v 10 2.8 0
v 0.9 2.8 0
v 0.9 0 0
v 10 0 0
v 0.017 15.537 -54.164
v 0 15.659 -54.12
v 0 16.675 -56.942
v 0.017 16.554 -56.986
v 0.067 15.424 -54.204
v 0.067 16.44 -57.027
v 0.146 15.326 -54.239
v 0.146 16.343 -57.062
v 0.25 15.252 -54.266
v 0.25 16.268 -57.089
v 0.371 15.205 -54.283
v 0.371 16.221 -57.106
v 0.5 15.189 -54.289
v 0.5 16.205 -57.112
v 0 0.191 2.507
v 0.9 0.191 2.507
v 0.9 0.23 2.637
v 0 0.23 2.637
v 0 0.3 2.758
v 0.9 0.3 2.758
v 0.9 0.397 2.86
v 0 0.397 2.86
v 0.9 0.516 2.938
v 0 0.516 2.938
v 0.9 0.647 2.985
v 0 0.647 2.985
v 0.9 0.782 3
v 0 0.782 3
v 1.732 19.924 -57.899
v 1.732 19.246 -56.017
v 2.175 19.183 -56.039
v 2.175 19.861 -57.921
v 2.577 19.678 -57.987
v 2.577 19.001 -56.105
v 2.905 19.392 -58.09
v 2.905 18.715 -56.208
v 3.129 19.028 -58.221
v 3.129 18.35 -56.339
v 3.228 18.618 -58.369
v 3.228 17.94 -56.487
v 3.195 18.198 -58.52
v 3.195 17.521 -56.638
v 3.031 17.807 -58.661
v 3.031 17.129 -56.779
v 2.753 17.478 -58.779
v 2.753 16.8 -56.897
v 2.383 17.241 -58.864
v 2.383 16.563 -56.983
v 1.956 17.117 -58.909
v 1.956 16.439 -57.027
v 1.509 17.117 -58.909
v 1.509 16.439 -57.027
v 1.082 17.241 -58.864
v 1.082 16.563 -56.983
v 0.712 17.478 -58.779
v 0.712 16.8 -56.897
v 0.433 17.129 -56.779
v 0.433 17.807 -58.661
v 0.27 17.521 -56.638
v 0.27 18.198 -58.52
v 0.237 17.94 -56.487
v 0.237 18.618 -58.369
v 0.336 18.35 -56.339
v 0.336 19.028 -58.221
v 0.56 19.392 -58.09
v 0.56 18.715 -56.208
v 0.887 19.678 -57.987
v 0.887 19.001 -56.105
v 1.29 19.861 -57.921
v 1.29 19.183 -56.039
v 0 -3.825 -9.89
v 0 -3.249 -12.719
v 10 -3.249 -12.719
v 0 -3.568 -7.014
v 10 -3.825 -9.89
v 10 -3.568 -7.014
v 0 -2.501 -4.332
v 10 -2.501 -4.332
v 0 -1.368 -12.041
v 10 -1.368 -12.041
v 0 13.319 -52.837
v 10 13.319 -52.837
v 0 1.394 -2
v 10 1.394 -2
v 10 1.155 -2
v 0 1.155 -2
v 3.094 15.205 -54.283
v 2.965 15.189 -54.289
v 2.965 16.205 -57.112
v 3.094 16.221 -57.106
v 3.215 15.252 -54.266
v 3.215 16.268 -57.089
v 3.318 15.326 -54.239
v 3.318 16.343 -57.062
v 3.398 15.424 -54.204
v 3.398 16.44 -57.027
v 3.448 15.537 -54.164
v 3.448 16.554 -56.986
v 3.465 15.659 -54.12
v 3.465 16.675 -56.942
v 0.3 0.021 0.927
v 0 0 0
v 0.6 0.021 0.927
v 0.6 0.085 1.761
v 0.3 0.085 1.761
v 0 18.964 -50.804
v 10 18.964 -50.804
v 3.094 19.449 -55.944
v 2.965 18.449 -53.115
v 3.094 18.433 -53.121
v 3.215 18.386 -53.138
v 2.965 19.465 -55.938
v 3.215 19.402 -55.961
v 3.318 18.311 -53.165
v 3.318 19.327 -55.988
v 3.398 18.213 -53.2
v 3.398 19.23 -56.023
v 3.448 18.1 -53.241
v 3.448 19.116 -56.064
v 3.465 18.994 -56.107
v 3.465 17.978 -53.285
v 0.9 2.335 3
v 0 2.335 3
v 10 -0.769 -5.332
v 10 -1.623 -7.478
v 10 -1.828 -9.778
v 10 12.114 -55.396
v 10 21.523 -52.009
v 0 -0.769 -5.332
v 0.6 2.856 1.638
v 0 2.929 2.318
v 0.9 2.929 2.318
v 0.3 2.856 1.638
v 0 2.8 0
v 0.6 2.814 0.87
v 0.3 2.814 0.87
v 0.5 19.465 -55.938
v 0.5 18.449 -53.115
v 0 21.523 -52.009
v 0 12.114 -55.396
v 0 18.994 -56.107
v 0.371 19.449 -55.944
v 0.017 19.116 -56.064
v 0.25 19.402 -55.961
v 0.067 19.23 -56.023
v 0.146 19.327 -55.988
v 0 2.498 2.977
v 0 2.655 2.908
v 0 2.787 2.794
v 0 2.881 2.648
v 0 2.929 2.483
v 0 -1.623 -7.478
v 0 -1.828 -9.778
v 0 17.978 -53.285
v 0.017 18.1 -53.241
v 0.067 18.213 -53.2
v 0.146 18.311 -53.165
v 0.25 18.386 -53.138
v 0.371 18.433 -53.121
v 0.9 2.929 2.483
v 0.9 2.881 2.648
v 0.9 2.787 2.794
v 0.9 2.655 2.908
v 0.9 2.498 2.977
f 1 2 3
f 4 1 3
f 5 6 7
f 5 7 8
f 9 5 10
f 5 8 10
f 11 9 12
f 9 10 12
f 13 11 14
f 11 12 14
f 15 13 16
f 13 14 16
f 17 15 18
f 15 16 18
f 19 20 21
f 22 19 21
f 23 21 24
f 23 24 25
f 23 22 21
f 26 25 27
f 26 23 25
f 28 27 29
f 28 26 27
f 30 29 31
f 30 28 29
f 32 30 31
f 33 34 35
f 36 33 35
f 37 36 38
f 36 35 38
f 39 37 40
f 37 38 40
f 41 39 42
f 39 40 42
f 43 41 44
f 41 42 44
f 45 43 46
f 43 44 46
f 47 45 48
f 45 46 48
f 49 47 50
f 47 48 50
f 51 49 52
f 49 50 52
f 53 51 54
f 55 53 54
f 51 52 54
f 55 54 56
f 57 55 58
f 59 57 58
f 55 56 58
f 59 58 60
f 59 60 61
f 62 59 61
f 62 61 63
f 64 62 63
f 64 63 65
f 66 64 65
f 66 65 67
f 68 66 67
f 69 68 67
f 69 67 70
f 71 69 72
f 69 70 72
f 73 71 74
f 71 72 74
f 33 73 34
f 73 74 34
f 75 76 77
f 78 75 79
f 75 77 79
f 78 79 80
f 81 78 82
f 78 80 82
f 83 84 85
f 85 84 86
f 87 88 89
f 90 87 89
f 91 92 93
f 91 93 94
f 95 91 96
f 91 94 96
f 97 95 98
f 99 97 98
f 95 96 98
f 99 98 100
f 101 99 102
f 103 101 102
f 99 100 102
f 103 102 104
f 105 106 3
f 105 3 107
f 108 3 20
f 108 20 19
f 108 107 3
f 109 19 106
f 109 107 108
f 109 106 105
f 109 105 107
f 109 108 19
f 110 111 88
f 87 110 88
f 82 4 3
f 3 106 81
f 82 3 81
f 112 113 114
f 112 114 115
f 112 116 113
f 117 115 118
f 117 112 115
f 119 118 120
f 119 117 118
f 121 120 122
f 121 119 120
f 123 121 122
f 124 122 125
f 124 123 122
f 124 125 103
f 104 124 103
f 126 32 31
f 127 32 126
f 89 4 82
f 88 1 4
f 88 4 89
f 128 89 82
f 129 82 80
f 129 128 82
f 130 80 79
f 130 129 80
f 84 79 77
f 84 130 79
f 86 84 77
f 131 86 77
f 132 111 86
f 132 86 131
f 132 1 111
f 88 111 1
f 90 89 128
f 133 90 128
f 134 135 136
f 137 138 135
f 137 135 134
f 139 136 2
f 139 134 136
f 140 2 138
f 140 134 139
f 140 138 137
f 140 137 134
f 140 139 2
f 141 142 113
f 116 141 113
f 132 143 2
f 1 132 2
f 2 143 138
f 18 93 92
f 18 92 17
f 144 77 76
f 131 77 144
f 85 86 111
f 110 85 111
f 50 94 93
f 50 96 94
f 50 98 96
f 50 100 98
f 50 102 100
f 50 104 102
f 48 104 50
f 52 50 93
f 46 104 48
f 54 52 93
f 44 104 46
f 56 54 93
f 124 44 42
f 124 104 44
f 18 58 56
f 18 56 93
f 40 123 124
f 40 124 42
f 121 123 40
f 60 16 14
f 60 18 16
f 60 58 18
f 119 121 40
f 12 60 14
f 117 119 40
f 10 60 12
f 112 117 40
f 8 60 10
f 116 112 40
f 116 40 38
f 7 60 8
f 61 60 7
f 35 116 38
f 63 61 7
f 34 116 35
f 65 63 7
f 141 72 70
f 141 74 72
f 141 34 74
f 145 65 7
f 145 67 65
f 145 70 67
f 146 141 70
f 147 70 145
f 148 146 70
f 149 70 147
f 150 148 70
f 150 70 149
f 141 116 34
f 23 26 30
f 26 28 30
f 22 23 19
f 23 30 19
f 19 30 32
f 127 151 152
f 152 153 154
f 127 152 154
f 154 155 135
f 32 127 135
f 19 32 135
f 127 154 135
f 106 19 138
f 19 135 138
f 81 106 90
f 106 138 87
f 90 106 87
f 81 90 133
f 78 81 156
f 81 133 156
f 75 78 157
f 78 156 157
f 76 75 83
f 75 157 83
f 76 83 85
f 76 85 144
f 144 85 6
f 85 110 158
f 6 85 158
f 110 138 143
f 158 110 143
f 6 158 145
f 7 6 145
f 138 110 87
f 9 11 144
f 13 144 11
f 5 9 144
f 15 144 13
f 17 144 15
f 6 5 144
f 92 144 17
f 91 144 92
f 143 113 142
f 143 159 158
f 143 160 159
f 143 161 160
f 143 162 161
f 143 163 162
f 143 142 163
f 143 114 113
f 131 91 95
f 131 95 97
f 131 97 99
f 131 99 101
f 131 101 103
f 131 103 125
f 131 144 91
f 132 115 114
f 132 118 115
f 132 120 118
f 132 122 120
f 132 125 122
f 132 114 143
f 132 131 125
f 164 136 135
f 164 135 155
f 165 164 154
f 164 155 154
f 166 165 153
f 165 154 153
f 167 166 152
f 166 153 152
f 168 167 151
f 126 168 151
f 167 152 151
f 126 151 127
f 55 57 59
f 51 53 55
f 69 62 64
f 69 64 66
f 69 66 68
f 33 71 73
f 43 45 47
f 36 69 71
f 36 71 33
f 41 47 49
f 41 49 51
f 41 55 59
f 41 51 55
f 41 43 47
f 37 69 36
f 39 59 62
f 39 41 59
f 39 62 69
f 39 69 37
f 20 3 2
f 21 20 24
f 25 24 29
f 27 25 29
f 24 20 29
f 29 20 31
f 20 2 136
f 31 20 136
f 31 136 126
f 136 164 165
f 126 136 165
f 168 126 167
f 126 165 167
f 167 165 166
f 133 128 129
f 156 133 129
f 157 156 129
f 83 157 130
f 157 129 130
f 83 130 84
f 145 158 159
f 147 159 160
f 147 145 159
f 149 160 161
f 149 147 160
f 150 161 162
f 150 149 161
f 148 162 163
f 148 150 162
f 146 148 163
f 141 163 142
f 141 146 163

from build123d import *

# Parameters (mm, degrees)
BOSS_EXTRUDE1_DEPTH = 0.9
FILLET1_R           = 0.5
BOSS_EXTRUDE2_DEPTH = 10
BOSS_EXTRUDE3_DEPTH = 10
BOSS_EXTRUDE4_DEPTH = 10
CUT_EXTRUDE2_DEPTH  = 61.26562122547703
FILLET2_R           = 10
CUT_EXTRUDE3_DEPTH  = 61.26562122547703
CUT_EXTRUDE4_DEPTH  = 61.265621208883815
FILLET3_R           = 0.6
SKETCH10_R          = 2.1
BOSS_EXTRUDE5_DEPTH = 3
SKETCH11_R          = 1.5
BOSS_EXTRUDE6_DEPTH = 2
BOSS_EXTRUDE7_DEPTH = 3
SKETCH14_R          = 1.5000000000000002
BOSS_EXTRUDE8_DEPTH = 2
FILLET4_R           = 0.5


# Read off the part's stored shape, not the designer's step: Split1
with BuildPart() as part:
    # Sketch1 → Boss-Extrude1 (new body)
    with BuildSketch(Plane(origin=(0, 0, 0), x_dir=(0, 0, -1), z_dir=(1, 0, 0))):
        with BuildLine():
            Line((0, 2.8), (0, 0))
            add(Edge.make_bspline(
                [(0, 0), (-5.0882686653691644, 0), (-6.101472647573343, 1.7391212131518174), (-7.000000000000001, 5.128421052631583)],
                knots=[0, 0, 0, 0, 1, 1, 1, 1], degree=3))
            add(Edge.make_bspline(
                [(-7.000000000000001, 5.128421052631583), (-4.554183023047009, 3.433770739772326), (-3.654213934684202, 2.799999999999996), (0, 2.8)],
                knots=[0, 0, 0, 0, 1, 1, 1, 1], degree=3))
        make_face()
    extrude(amount=BOSS_EXTRUDE1_DEPTH)

    # Fillet1
    fillet1_edges = [part.edges().sort_by_distance(p)[0] for p in [
        (0.45, 5.128421052631583, 7.000000000000001),
    ]]
    fillet(fillet1_edges, radius=FILLET1_R)

    # Sketch3 → Boss-Extrude2 (add)
    with BuildSketch(Plane(origin=(0, 0, 0), x_dir=(0, 0, -1), z_dir=(1, 0, 0))):
        Polygon((0, 0), (40, 0), (40, 10), (20, 9.999999999999998), (0, 2.8), align=None)
    extrude(amount=BOSS_EXTRUDE2_DEPTH)

    # Sketch5 → Boss-Extrude3 (add)
    with BuildSketch(Plane(origin=(0, 0, 0), x_dir=(0, 0, -1), z_dir=(1, 0, 0))):
        Polygon((0, 0), (20.000000000000004, -11.54700538379255), (40, -11.547005383792548), (40, 0), align=None)
    extrude(amount=BOSS_EXTRUDE3_DEPTH)

    # Sketch6 → Boss-Extrude4 (add)
    with BuildSketch(Plane(origin=(10, 0, 0), x_dir=(0, 0, -1), z_dir=(1, 0, 0))):
        Polygon((8.351482323931023, -4.821730567853972), (55.39585291736738, 12.114242845783108), (52.00865823463995, 21.523116964470375), (20, 9.999999999999998), align=None)
    extrude(amount=-BOSS_EXTRUDE4_DEPTH)

    # Sketch7 → Cut-Extrude2 (cut, through all)
    with BuildSketch(Plane(origin=(10, 0, 0), x_dir=(0, 0, -1), z_dir=(1, 0, 0))):
        Polygon((40, 6.571735795530855), (-6.396657859934056, -10.1310610340454), (25.03138273349842, -20.31963634568749), (52.56184703999606, -5.85197020171655), align=None)
    extrude(amount=-CUT_EXTRUDE2_DEPTH, mode=Mode.SUBTRACT)

    # Fillet2
    fillet2_edges = [part.edges().sort_by_distance(p)[0] for p in [
        (5, -4.821730567853985, -8.351482323931002),
    ]]
    fillet(fillet2_edges, radius=FILLET2_R)

    # Sketch8 → Cut-Extrude3 (cut, through all)
    with BuildSketch(Plane(origin=(10, 0, 0), x_dir=(0, 0, -1), z_dir=(1, 0, 0))):
        with BuildLine():
            Line((2, 1.15470053837925), (5.3316294573154766, -0.7688166256419326))
            ThreePointArc((5.3316294573154766, -0.7688166256419326), (8.6203969477251, -1.8089349449339256), (12.041385203497414, -1.3677126903162435))
            Line((12.041385203497414, -1.3677126903162435), (52.83663915708444, 13.318578732975077))
            Line((52.83663915708444, 13.318578732975077), (50.80432234744798, 18.963903204187442))
            Line((50.80432234744798, 18.963903204187442), (2, 1.394347159106174))
            Line((2, 1.394347159106174), (2, 1.15470053837925))
        make_face()
    extrude(amount=-CUT_EXTRUDE3_DEPTH, mode=Mode.SUBTRACT)

    # Sketch9 → Cut-Extrude4 (cut, through all)
    with BuildSketch(Plane.ZY):
        Polygon((3.0000000000000013, -0.988739395943905), (3.0000000000000004, 5.799008427986812), (9.091562908025708, 5.799008427986812), (9.091562908025708, -1.8536705996620422), align=None)
    extrude(amount=-CUT_EXTRUDE4_DEPTH, mode=Mode.SUBTRACT)

    # Fillet3
    fillet3_edges = [part.edges().sort_by_distance(p)[0] for p in [
        (0.45, 0.2958164494648414, 3.0000000000000013),
        (0.45, 3.0492242349736607, 3.000000000000001),
    ]]
    fillet(fillet3_edges, radius=FILLET3_R)

    # Sketch10 → Boss-Extrude5 (add)
    with BuildSketch(Plane(origin=(0, 19.04436342339395, -52.90100950942748), x_dir=(-1, 0, 0), z_dir=(0, 0.33871946827274263, -0.9408874118687265))):
        with Locations(Location((-5, -2.365515246767623, 0), (0, 0, 270))):
            Circle(SKETCH10_R)
    extrude(amount=BOSS_EXTRUDE5_DEPTH)

    # Sketch11 → Boss-Extrude6 (add)
    with BuildSketch(Plane(origin=(0, 20.060521828212188, -55.72367174503367), x_dir=(-1, 0, 0), z_dir=(0, 0.33871946827274263, -0.9408874118687265))):
        with Locations(Location((-5, -2.365515246767633, 0), (0, 0, 90))):
            Circle(SKETCH11_R)
    extrude(amount=BOSS_EXTRUDE6_DEPTH)


with BuildPart() as body_2:
    # Split1: the piece on the far side of the plane
    add(part.part)
    split(bisect_by=Plane(origin=(0, 19.044363423, -52.901009509), x_dir=(1, 0, 0), z_dir=(0, 0.33871946827274285, -0.9408874118687265)), keep=Keep.BOTTOM)


with BuildPart() as part_1:
    add(part.part)

    # Split1
    split(bisect_by=Plane(origin=(0, 19.044363423, -52.901009509), x_dir=(1, 0, 0), z_dir=(0, 0.33871946827274285, -0.9408874118687265)), keep=Keep.TOP)


with BuildPart() as body_3:
    # Sketch13 → Boss-Extrude7 (new body)
    with BuildSketch(Plane(origin=(0, 19.04436342339395, -52.90100950942748), x_dir=(-1, 0, 0), z_dir=(0, 0.33871946827274263, -0.9408874118687265))):
        Polygon((-3.4648232278140823, -4.097926860674667), (6e-17, -4.097926860674667), (4e-17, -0.6331036328605839), (-3.4648232278140823, -0.6331036328605846), align=None)
    extrude(amount=BOSS_EXTRUDE7_DEPTH)


with BuildPart() as body_4:
    # Sketch14 → Boss-Extrude8 (new body)
    with BuildSketch(Plane(origin=(0, 20.060521828212188, -55.72367174503367), x_dir=(-1, 0, 0), z_dir=(0, 0.33871946827274263, -0.9408874118687265))):
        with Locations(Location((-1.7324116139070413, -2.3655152467676324, 0), (0, 0, 90))):
            Circle(SKETCH14_R)
    extrude(amount=BOSS_EXTRUDE8_DEPTH)


with BuildPart() as body_2_1:
    add(body_2.part)

    # Combine1: union body 3, body 4
    add(body_3.part)
    add(body_4.part)

    # Fillet4
    fillet4_edges = [body_2_1.edges().sort_by_distance(p)[0] for p in [
        (-6e-17, 15.69675482783554, -55.70038823449888),
        (-4e-17, 18.95676338723618, -54.526785153114645),
        (3.4648232278140823, 18.95676338723618, -54.526785153114645),
        (3.4648232278140823, 15.69675482783554, -55.70038823449888),
    ]]
    fillet(fillet4_edges, radius=FILLET4_R)


solid = body_2_1.part
